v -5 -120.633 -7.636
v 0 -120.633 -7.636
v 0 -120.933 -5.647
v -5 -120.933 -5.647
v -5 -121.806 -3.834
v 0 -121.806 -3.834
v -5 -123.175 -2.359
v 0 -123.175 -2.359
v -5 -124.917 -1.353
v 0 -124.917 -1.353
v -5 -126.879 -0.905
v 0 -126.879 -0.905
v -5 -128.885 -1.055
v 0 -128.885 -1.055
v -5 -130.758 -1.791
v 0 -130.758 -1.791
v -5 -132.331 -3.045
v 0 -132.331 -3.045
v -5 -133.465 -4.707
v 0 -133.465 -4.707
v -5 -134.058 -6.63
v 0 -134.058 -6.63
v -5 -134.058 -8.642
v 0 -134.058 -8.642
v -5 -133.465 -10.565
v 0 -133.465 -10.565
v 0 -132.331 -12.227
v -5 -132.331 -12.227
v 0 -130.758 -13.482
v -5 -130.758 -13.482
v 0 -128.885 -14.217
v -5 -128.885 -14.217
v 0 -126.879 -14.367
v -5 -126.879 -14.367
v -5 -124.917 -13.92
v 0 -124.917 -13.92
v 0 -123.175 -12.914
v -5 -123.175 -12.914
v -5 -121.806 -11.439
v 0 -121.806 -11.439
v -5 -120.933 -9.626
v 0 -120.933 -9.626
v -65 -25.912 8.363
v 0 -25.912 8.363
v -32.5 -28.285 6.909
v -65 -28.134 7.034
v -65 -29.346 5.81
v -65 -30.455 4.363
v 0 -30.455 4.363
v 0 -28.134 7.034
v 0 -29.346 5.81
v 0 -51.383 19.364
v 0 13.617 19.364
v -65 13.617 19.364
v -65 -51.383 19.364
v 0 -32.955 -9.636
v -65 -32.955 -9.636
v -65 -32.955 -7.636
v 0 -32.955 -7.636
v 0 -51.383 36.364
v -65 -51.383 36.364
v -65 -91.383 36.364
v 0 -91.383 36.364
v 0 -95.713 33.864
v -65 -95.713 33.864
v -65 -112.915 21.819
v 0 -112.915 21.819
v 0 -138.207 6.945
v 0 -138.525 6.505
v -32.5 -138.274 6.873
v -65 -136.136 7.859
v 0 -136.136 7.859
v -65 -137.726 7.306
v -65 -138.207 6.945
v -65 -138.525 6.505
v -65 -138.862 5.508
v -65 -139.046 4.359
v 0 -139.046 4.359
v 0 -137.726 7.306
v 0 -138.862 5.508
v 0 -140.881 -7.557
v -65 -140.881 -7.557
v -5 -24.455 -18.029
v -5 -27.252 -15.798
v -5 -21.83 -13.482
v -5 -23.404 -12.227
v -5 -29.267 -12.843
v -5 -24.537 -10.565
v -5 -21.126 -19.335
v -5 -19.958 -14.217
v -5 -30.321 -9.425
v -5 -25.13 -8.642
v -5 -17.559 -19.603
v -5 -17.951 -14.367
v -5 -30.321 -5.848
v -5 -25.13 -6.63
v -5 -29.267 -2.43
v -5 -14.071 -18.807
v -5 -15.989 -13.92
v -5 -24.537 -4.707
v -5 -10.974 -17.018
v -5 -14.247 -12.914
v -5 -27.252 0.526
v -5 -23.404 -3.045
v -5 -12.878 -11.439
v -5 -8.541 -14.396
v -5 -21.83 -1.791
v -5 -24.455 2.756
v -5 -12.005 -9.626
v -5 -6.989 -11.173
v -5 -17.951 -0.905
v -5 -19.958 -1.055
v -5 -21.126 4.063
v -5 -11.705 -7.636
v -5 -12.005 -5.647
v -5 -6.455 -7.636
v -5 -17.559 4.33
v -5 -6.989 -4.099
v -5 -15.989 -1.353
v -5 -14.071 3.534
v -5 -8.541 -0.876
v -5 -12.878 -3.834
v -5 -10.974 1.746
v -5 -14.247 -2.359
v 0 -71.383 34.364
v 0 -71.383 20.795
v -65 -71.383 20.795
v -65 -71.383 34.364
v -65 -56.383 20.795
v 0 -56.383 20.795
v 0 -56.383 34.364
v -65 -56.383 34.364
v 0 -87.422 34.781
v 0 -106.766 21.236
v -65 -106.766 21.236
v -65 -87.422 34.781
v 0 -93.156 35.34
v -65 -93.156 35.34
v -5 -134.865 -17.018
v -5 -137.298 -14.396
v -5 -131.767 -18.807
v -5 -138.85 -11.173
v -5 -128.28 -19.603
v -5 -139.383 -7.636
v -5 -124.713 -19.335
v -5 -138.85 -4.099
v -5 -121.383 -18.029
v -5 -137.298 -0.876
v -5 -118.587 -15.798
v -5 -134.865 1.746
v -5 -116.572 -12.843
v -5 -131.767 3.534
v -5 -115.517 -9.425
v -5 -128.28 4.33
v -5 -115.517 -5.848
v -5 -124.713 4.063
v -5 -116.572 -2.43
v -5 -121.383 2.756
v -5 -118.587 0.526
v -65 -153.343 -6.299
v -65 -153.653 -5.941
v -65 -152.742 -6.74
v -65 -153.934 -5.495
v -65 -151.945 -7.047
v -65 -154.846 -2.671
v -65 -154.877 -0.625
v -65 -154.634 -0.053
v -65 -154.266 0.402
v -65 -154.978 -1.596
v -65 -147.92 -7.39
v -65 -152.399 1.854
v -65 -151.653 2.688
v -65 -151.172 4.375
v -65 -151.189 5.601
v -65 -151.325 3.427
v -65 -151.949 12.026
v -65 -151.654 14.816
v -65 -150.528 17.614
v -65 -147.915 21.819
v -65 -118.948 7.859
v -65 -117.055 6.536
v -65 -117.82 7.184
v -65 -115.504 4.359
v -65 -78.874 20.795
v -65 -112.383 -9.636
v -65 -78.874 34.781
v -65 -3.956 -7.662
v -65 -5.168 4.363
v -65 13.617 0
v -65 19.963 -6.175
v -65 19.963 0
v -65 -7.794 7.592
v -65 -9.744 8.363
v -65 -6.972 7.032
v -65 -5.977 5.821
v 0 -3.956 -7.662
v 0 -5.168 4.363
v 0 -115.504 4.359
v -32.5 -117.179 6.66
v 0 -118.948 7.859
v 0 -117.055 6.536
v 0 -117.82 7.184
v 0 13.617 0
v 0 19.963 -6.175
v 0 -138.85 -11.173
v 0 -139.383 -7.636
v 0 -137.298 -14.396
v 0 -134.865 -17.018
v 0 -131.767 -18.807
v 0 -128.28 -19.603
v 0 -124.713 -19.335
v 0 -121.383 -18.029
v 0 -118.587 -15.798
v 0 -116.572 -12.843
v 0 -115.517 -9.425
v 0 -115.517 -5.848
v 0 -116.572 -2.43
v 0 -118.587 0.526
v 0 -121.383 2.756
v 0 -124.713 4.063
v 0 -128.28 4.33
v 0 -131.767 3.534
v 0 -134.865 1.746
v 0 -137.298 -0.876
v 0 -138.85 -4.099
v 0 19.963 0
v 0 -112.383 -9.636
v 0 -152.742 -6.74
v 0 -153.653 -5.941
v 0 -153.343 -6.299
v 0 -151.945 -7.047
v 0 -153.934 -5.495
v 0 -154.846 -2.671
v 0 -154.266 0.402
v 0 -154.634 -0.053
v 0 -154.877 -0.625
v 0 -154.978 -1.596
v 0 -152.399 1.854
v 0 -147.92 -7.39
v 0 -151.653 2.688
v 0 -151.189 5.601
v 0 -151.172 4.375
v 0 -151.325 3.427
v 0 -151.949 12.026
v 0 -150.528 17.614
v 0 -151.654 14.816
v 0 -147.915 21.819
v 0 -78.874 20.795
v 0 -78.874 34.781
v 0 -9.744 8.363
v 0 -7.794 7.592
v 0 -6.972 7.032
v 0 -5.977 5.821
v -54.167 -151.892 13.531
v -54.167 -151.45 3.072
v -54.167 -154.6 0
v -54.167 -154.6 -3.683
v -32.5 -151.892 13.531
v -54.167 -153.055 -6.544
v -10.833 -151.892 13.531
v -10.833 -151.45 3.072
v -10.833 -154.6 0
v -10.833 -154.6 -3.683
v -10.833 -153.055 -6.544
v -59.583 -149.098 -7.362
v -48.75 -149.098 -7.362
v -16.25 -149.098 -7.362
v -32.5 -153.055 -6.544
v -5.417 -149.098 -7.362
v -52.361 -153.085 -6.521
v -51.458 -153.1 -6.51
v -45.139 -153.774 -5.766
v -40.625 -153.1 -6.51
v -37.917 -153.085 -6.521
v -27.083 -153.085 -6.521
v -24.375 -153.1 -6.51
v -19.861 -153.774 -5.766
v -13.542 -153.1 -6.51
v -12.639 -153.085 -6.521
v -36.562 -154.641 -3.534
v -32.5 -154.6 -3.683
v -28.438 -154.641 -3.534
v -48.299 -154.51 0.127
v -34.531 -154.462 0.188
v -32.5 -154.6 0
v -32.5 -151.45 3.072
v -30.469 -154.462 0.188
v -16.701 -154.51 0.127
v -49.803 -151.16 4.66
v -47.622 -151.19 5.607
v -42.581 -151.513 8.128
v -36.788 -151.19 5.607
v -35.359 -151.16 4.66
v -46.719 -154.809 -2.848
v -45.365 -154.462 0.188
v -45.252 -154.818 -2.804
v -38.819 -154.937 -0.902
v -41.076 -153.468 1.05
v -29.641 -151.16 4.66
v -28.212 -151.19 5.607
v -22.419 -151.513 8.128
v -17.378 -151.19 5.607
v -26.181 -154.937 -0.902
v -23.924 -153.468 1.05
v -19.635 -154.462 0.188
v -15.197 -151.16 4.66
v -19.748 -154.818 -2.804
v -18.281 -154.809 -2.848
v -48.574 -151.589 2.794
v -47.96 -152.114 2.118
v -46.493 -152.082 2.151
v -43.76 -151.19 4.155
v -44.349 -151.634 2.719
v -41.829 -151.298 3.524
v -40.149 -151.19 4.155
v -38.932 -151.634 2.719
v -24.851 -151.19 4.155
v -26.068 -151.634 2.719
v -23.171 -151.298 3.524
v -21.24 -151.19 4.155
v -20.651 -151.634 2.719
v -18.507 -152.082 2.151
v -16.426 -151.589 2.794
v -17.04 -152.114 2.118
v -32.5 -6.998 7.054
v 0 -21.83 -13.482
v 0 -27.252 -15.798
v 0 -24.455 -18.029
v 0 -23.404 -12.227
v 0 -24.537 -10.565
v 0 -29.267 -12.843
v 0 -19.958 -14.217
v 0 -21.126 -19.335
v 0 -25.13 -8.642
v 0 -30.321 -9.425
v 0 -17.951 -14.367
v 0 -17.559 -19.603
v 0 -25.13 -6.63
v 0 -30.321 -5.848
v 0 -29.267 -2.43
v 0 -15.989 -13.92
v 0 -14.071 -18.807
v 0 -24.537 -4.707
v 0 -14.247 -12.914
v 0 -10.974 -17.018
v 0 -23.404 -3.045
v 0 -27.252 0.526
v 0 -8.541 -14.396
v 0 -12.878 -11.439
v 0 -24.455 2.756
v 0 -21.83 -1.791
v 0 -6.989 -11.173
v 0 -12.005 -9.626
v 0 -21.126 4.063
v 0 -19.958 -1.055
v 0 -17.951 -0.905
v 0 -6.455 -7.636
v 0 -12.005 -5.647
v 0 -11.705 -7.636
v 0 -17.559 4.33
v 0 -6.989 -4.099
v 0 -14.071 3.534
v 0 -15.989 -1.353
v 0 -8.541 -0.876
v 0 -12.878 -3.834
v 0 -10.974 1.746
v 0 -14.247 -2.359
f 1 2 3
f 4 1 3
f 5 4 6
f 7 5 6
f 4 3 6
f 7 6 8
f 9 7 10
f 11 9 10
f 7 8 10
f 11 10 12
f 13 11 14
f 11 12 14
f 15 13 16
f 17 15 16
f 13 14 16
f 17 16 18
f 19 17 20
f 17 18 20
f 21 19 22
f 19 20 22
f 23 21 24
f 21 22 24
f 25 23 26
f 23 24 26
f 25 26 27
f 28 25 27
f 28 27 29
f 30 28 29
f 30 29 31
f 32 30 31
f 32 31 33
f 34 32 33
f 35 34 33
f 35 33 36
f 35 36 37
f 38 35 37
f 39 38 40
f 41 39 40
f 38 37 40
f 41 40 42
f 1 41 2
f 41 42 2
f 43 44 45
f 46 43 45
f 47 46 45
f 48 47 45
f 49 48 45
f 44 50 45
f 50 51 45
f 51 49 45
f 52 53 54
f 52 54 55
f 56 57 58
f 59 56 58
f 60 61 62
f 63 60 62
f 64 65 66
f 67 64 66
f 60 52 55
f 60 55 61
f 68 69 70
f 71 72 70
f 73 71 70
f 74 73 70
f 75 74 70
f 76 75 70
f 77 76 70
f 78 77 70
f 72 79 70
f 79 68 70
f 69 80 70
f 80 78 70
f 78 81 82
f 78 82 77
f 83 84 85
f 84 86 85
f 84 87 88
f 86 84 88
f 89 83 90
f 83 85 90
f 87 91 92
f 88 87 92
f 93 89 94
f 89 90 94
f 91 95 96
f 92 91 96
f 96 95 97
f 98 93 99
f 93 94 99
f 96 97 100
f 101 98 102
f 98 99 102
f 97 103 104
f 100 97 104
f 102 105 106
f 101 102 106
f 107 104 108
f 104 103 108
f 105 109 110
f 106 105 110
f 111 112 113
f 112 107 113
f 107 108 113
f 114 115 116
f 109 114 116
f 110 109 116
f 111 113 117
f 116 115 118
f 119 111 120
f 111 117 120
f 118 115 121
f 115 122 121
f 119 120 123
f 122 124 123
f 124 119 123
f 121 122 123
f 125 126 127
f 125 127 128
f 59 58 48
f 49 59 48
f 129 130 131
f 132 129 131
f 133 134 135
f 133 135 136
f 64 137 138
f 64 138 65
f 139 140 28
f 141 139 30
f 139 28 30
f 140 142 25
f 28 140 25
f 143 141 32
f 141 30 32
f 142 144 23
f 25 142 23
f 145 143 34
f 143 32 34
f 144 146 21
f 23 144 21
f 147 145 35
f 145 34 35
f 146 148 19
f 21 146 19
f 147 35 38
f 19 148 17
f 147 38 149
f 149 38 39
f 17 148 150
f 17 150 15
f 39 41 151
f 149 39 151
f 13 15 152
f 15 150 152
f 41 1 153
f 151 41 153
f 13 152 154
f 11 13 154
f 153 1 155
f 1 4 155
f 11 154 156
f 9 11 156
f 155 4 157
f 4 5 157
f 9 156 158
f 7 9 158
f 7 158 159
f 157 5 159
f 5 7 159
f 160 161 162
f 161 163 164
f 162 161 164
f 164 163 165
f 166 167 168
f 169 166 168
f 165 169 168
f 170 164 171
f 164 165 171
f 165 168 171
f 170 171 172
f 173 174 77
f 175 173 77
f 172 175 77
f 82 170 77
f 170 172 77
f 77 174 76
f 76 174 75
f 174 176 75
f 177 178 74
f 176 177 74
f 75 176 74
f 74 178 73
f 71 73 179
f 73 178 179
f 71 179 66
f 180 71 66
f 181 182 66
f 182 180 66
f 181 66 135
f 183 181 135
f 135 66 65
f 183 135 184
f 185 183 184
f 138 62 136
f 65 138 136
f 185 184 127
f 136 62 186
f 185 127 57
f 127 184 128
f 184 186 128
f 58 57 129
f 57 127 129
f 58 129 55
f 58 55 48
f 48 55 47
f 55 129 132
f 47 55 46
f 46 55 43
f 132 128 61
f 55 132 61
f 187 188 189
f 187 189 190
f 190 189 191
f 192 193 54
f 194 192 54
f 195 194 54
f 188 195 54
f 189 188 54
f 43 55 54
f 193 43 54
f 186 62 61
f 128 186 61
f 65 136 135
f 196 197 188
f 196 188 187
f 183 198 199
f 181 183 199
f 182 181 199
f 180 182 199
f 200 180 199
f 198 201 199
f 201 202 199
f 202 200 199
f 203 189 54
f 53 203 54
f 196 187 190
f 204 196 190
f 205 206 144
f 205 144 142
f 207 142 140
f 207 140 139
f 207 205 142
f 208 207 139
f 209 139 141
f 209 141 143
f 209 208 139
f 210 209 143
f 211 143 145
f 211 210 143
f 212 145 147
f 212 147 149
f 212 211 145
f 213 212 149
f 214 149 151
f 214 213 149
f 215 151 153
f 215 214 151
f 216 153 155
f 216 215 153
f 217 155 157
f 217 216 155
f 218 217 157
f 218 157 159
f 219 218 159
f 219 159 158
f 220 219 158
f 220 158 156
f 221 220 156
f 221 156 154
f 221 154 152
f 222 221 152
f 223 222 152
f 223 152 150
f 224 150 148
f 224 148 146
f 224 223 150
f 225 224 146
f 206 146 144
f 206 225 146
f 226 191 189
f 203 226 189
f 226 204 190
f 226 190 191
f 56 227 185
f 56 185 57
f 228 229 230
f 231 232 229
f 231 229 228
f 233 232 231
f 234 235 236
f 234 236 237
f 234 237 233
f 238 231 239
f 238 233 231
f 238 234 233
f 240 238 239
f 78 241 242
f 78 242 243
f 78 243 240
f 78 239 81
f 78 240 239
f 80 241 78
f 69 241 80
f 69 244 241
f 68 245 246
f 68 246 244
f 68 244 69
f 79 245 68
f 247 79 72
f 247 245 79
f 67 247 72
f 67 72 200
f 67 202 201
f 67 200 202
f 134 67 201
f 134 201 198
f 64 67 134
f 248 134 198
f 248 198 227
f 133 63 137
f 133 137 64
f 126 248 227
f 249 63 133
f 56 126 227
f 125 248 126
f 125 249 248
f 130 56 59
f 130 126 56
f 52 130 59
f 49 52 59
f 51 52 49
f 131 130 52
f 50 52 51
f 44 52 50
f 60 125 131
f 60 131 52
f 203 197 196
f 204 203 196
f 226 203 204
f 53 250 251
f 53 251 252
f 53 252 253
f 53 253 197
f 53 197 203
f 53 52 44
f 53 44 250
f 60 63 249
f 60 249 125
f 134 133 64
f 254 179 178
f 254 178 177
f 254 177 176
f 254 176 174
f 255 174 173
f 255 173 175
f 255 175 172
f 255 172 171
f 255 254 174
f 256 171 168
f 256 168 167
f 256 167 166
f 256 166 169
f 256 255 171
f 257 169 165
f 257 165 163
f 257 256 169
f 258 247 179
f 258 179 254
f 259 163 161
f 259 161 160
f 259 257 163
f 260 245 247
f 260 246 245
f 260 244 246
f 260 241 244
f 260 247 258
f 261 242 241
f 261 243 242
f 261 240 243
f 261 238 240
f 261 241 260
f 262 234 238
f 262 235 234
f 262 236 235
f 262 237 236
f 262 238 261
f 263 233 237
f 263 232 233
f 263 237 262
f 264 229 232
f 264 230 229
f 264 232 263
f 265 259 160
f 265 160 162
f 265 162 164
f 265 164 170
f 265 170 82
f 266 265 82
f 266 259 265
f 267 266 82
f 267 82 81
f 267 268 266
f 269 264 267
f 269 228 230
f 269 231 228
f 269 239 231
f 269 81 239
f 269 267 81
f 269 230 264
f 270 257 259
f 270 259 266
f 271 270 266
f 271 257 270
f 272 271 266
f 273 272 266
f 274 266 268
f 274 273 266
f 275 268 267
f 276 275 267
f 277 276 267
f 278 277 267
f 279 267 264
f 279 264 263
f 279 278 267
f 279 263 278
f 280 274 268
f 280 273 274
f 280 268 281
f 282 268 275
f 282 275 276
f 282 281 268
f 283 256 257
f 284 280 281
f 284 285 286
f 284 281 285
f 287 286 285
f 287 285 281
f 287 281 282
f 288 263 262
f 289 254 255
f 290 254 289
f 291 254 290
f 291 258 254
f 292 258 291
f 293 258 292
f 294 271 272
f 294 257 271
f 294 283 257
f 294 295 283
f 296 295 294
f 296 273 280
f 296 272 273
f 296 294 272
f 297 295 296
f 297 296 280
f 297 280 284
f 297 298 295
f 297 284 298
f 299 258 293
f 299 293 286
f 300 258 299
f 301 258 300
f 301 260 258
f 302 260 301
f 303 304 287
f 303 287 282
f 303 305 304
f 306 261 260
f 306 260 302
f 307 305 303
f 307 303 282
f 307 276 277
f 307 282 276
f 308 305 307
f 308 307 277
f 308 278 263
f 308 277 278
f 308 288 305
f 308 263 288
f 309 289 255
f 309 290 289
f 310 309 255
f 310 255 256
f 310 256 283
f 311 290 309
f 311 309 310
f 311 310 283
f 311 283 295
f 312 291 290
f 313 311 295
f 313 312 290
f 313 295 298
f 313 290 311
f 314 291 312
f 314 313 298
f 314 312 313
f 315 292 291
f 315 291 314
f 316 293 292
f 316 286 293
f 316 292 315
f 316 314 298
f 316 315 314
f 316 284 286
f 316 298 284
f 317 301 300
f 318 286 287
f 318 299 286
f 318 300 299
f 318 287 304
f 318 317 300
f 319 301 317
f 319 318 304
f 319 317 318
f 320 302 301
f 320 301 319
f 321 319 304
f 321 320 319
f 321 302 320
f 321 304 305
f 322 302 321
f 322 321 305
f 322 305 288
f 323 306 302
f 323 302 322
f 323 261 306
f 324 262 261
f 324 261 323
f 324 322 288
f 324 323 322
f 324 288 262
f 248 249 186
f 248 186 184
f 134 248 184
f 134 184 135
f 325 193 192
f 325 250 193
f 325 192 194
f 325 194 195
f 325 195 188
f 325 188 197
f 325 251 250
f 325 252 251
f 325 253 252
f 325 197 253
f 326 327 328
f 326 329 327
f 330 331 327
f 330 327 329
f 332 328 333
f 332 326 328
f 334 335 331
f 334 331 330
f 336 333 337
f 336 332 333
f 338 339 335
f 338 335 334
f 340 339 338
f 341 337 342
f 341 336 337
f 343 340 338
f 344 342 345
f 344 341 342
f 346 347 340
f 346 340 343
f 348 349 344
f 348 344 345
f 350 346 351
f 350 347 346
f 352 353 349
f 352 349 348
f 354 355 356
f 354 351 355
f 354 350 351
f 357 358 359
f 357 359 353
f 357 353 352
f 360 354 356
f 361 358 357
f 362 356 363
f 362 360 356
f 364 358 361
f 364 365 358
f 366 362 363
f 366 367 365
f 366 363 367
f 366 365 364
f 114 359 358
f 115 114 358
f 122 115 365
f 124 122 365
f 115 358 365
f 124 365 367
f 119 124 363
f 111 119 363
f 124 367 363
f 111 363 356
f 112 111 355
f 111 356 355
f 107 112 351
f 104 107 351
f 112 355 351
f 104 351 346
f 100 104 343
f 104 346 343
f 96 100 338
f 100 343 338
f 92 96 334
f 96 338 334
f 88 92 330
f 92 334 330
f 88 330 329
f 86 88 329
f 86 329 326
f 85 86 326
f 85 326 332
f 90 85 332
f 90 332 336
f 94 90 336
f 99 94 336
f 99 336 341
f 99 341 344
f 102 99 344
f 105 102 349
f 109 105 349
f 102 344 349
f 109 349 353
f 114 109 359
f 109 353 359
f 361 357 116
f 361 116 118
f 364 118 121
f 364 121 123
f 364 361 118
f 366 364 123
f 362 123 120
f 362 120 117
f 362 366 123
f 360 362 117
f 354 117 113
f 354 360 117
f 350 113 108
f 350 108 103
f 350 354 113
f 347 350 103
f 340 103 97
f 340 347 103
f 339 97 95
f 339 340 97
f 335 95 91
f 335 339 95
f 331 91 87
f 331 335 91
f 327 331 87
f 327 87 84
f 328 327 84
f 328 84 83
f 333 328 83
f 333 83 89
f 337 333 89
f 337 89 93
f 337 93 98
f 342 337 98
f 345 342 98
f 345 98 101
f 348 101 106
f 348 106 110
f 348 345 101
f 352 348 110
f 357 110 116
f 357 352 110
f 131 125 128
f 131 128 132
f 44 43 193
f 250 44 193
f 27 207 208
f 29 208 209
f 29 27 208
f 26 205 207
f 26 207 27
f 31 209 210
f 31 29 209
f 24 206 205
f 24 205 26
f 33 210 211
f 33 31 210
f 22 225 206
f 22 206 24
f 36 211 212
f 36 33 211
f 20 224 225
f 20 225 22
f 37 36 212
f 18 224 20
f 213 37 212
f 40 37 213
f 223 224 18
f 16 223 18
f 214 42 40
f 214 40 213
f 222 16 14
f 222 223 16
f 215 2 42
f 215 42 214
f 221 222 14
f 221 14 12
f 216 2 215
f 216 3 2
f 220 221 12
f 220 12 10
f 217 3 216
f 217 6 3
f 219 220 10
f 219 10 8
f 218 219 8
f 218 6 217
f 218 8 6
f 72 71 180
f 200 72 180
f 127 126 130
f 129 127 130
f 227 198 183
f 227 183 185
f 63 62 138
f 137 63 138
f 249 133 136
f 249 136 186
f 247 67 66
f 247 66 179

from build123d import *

# Parameters (mm, degrees)
F0_W     = 14.9999984481
F0_H     = 13.5688162344
F1_DEPTH = 65
F0_R     = 10.5
F0_R_2   = 6.75
F2_DEPTH = 5
F0_R_3   = 12
F3_DEPTH = 5


with BuildPart() as f1:
    # F0 (on Right) → F1 (new body)
    with BuildSketch(Plane.YZ):
        with BuildLine():
            Line((13.6168329716, 19.3637886377), (-51.3831670284, 19.3637886377))
            Line((-51.3831670284, 19.3637886377), (-51.3831670284, -7.6362113623))
            Line((-51.3831670284, -7.6362113623), (-50.3831670284, -7.6362113623))
            Line((-50.3831670284, -7.6362113623), (-37.3831670284, -7.6362113623))
            Line((-37.3831670284, -7.6362113623), (-32.9554889213, -7.6362113623))
            Line((-32.9554889213, -7.6362113623), (-30.4554889213, 4.3626378955))
            add(Edge.make_bspline(
                [(-25.9120240808, 8.3626378955), (-26.7340935226, 7.9471925583), (-28.4577103209, 7.076136507), (-29.7694015341, 5.2945215247), (-30.4554889213, 4.3626378955)],
                knots=[0, 0, 0, 0, 0.4769444361, 1, 1, 1, 1], degree=3))
            Line((-25.9120240808, 8.3626378955), (-18.2893068268, 8.3626378955))
            Line((-18.2893068268, 8.3626378955), (-9.74352099, 8.3626378955))
            add(Edge.make_bspline(
                [(-9.74352099, 8.3626378955), (-8.7483018502, 8.0324388543), (-6.7235586512, 7.3606589052), (-5.6921692008, 5.373202623), (-5.1677371375, 4.3626378955)],
                knots=[0, 0, 0, 0, 0.4915285753, 1, 1, 1, 1], degree=3))
            Line((-5.1677371375, 4.3626378955), (-3.9555160886, -7.6617459406))
            Line((-3.9555160886, -7.6617459406), (19.9634600431, -6.1754914932))
            Line((19.9634600431, -6.1754914932), (19.9634600431, 0))
            Line((19.9634600431, 0), (13.6168329716, 0))
            Line((13.6168329716, 0), (13.6168329716, 5.8132377453))
            Line((13.6168329716, 5.8132377453), (13.6168329716, 16.6227482259))
            Line((13.6168329716, 16.6227482259), (13.6168329716, 19.3637886377))
        make_face()
        Polygon((-51.3831670284, -7.6362113623), (-51.3831670284, 19.3637886377), (-51.3831670284, 36.3637886377), (-54.3831670284, 36.3637886377), (-54.3831670284, 32.9090120468), (-54.3831670284, 21.235744), (-54.3831670284, 20.7949716274), (-54.3831670284, -7.6362113623), align=None)
        Polygon((-54.3831670284, 32.9090120468), (-54.3831670284, 36.3637886377), (-73.3831670284, 36.3637886377), (-73.3831670284, 20.7949716274), (-73.3831670284, -7.6362113623), (-54.3831670284, -7.6362113623), (-54.3831670284, 20.7949716274), (-54.3831670284, 21.235744), align=None)
        with Locations((-63.8831670284, 27.5793797446)):
            Rectangle(F0_W, F0_H, mode=Mode.SUBTRACT)
        Polygon((-73.3831670284, 20.7949716274), (-73.3831670284, 36.3637886377), (-91.3831670284, 36.3637886377), (-93.1555780102, 35.3404866803), (-90.1094796242, 35.3404866803), (-108.3831670284, 22.5451130089), (-108.3831670284, -7.6362113623), (-73.3831670284, -7.6362113623), align=None)
        Polygon((-79.8739611272, 20.8107742901), (-106.7662461772, 21.235744), (-87.4216623646, 34.7809674092), (-78.8739611272, 34.7809674092), (-78.8739611272, 33.7809674092), (-78.8739611272, 21.7950964817), (-78.8739611272, 20.7949716274), align=None, mode=Mode.SUBTRACT)
        Polygon((-90.1094796242, 35.3404866803), (-93.1555780102, 35.3404866803), (-95.7132940473, 33.8637886377), (-112.9154869774, 21.8186834744), (-108.3831670284, 22.5451130089), align=None)
        with BuildLine():
            Line((-50.3831670284, -7.6362113623), (-51.3831670284, -7.6362113623))
            Line((-51.3831670284, -7.6362113623), (-54.3831670284, -7.6362113623))
            Line((-54.3831670284, -7.6362113623), (-73.3831670284, -7.6362113623))
            Line((-73.3831670284, -7.6362113623), (-108.3831670284, -7.6362113623))
            Line((-108.3831670284, -7.6362113623), (-108.3831670284, 22.5451130089))
            Line((-108.3831670284, 22.5451130089), (-112.9154869774, 21.8186834744))
            Line((-112.9154869774, 21.8186834744), (-147.9154869774, 21.8186834744))
            add(Edge.make_bspline(
                [(-147.9154869774, 21.8186834744), (-149.1536564289, 19.67791006), (-154.0189609297, 14.0869836841), (-149.2849787354, 2.4163080317), (-155.5595316841, 0.5852340032), (-154.6775664328, -3.7540940806), (-153.1522320855, -7.9726665518), (-148.1667744767, -7.2170682005), (-140.8810786145, -7.5570856366)],
                knots=[0, 0, 0, 0, 0.192009274, 0.3969047545, 0.5297406286, 0.6512700234, 0.7654702459, 0.9854587223, 0.9854587223, 0.9854587223, 0.9854587223], degree=3))
            Line((-140.8810786145, -7.5570856366), (-139.0460431576, 4.3590777611))
            add(Edge.make_bspline(
                [(-136.1361294985, 7.8590777611), (-136.9627322848, 7.6432383208), (-138.6630008993, 7.1992705142), (-138.9160278292, 5.3231191572), (-139.0460431576, 4.3590777611)],
                knots=[0, 0, 0, 0, 0.4861601157, 1, 1, 1, 1], degree=3))
            Line((-136.1361294985, 7.8590777611), (-127.0469545254, 7.8590777611))
            Line((-127.0469545254, 7.8590777611), (-118.9482361078, 7.8590777611))
            add(Edge.make_bspline(
                [(-115.5044957995, 4.3590777611), (-116.029864992, 5.2079705346), (-117.0105401826, 6.7925478079), (-118.333851613, 7.5209135228), (-118.9482361078, 7.8590777611)],
                knots=[0, 0, 0, 0, 0.5357219164, 1, 1, 1, 1], degree=3))
            Line((-115.5044957995, 4.3590777611), (-112.3831670284, -9.6362113623))
            Line((-112.3831670284, -9.6362113623), (-73.3831670284, -9.6362113623))
            Line((-73.3831670284, -9.6362113623), (-32.9554889213, -9.6362113623))
            Line((-32.9554889213, -9.6362113623), (-32.9554889213, -7.6362113623))
            Line((-32.9554889213, -7.6362113623), (-37.3831670284, -7.6362113623))
            Line((-37.3831670284, -7.6362113623), (-50.3831670284, -7.6362113623))
        make_face()
    extrude(amount=-F1_DEPTH)


with BuildPart() as f2:
    # F0 (on Right) → F2 (new body)
    with BuildSketch(Plane.YZ):
        with BuildLine():
            ThreePointArc((-115.3831670284, -7.6362113623), (-127.3831670284, 4.3637886377), (-139.3831670284, -7.6362113623))
            ThreePointArc((-139.3831670284, -7.6362113623), (-127.3831670284, -19.6362113623), (-115.3831670284, -7.6362113623))
        make_face()
        with Locations((-127.3831670284, -7.6362113623)):
            Circle(F0_R, mode=Mode.SUBTRACT)
        with Locations((-127.3831670284, -7.6362113623)):
            Circle(F0_R)
        with Locations((-127.3831670284, -7.6362113623)):
            Circle(F0_R_2, mode=Mode.SUBTRACT)
    extrude(amount=-F2_DEPTH)


with BuildPart() as f3:
    # F0 (on Right) → F3 (new body)
    with BuildSketch(Plane.YZ):
        with Locations((-18.4554889213, -7.6362113623)):
            Circle(F0_R_3)
        with Locations((-18.4554889213, -7.6362113623)):
            Circle(F0_R, mode=Mode.SUBTRACT)
        with Locations((-18.4554889213, -7.6362113623)):
            Circle(F0_R)
        with Locations((-18.4554889213, -7.6362113623)):
            Circle(F0_R_2, mode=Mode.SUBTRACT)
    extrude(amount=-F3_DEPTH)


solid = Compound([f1.part, f2.part, f3.part])
